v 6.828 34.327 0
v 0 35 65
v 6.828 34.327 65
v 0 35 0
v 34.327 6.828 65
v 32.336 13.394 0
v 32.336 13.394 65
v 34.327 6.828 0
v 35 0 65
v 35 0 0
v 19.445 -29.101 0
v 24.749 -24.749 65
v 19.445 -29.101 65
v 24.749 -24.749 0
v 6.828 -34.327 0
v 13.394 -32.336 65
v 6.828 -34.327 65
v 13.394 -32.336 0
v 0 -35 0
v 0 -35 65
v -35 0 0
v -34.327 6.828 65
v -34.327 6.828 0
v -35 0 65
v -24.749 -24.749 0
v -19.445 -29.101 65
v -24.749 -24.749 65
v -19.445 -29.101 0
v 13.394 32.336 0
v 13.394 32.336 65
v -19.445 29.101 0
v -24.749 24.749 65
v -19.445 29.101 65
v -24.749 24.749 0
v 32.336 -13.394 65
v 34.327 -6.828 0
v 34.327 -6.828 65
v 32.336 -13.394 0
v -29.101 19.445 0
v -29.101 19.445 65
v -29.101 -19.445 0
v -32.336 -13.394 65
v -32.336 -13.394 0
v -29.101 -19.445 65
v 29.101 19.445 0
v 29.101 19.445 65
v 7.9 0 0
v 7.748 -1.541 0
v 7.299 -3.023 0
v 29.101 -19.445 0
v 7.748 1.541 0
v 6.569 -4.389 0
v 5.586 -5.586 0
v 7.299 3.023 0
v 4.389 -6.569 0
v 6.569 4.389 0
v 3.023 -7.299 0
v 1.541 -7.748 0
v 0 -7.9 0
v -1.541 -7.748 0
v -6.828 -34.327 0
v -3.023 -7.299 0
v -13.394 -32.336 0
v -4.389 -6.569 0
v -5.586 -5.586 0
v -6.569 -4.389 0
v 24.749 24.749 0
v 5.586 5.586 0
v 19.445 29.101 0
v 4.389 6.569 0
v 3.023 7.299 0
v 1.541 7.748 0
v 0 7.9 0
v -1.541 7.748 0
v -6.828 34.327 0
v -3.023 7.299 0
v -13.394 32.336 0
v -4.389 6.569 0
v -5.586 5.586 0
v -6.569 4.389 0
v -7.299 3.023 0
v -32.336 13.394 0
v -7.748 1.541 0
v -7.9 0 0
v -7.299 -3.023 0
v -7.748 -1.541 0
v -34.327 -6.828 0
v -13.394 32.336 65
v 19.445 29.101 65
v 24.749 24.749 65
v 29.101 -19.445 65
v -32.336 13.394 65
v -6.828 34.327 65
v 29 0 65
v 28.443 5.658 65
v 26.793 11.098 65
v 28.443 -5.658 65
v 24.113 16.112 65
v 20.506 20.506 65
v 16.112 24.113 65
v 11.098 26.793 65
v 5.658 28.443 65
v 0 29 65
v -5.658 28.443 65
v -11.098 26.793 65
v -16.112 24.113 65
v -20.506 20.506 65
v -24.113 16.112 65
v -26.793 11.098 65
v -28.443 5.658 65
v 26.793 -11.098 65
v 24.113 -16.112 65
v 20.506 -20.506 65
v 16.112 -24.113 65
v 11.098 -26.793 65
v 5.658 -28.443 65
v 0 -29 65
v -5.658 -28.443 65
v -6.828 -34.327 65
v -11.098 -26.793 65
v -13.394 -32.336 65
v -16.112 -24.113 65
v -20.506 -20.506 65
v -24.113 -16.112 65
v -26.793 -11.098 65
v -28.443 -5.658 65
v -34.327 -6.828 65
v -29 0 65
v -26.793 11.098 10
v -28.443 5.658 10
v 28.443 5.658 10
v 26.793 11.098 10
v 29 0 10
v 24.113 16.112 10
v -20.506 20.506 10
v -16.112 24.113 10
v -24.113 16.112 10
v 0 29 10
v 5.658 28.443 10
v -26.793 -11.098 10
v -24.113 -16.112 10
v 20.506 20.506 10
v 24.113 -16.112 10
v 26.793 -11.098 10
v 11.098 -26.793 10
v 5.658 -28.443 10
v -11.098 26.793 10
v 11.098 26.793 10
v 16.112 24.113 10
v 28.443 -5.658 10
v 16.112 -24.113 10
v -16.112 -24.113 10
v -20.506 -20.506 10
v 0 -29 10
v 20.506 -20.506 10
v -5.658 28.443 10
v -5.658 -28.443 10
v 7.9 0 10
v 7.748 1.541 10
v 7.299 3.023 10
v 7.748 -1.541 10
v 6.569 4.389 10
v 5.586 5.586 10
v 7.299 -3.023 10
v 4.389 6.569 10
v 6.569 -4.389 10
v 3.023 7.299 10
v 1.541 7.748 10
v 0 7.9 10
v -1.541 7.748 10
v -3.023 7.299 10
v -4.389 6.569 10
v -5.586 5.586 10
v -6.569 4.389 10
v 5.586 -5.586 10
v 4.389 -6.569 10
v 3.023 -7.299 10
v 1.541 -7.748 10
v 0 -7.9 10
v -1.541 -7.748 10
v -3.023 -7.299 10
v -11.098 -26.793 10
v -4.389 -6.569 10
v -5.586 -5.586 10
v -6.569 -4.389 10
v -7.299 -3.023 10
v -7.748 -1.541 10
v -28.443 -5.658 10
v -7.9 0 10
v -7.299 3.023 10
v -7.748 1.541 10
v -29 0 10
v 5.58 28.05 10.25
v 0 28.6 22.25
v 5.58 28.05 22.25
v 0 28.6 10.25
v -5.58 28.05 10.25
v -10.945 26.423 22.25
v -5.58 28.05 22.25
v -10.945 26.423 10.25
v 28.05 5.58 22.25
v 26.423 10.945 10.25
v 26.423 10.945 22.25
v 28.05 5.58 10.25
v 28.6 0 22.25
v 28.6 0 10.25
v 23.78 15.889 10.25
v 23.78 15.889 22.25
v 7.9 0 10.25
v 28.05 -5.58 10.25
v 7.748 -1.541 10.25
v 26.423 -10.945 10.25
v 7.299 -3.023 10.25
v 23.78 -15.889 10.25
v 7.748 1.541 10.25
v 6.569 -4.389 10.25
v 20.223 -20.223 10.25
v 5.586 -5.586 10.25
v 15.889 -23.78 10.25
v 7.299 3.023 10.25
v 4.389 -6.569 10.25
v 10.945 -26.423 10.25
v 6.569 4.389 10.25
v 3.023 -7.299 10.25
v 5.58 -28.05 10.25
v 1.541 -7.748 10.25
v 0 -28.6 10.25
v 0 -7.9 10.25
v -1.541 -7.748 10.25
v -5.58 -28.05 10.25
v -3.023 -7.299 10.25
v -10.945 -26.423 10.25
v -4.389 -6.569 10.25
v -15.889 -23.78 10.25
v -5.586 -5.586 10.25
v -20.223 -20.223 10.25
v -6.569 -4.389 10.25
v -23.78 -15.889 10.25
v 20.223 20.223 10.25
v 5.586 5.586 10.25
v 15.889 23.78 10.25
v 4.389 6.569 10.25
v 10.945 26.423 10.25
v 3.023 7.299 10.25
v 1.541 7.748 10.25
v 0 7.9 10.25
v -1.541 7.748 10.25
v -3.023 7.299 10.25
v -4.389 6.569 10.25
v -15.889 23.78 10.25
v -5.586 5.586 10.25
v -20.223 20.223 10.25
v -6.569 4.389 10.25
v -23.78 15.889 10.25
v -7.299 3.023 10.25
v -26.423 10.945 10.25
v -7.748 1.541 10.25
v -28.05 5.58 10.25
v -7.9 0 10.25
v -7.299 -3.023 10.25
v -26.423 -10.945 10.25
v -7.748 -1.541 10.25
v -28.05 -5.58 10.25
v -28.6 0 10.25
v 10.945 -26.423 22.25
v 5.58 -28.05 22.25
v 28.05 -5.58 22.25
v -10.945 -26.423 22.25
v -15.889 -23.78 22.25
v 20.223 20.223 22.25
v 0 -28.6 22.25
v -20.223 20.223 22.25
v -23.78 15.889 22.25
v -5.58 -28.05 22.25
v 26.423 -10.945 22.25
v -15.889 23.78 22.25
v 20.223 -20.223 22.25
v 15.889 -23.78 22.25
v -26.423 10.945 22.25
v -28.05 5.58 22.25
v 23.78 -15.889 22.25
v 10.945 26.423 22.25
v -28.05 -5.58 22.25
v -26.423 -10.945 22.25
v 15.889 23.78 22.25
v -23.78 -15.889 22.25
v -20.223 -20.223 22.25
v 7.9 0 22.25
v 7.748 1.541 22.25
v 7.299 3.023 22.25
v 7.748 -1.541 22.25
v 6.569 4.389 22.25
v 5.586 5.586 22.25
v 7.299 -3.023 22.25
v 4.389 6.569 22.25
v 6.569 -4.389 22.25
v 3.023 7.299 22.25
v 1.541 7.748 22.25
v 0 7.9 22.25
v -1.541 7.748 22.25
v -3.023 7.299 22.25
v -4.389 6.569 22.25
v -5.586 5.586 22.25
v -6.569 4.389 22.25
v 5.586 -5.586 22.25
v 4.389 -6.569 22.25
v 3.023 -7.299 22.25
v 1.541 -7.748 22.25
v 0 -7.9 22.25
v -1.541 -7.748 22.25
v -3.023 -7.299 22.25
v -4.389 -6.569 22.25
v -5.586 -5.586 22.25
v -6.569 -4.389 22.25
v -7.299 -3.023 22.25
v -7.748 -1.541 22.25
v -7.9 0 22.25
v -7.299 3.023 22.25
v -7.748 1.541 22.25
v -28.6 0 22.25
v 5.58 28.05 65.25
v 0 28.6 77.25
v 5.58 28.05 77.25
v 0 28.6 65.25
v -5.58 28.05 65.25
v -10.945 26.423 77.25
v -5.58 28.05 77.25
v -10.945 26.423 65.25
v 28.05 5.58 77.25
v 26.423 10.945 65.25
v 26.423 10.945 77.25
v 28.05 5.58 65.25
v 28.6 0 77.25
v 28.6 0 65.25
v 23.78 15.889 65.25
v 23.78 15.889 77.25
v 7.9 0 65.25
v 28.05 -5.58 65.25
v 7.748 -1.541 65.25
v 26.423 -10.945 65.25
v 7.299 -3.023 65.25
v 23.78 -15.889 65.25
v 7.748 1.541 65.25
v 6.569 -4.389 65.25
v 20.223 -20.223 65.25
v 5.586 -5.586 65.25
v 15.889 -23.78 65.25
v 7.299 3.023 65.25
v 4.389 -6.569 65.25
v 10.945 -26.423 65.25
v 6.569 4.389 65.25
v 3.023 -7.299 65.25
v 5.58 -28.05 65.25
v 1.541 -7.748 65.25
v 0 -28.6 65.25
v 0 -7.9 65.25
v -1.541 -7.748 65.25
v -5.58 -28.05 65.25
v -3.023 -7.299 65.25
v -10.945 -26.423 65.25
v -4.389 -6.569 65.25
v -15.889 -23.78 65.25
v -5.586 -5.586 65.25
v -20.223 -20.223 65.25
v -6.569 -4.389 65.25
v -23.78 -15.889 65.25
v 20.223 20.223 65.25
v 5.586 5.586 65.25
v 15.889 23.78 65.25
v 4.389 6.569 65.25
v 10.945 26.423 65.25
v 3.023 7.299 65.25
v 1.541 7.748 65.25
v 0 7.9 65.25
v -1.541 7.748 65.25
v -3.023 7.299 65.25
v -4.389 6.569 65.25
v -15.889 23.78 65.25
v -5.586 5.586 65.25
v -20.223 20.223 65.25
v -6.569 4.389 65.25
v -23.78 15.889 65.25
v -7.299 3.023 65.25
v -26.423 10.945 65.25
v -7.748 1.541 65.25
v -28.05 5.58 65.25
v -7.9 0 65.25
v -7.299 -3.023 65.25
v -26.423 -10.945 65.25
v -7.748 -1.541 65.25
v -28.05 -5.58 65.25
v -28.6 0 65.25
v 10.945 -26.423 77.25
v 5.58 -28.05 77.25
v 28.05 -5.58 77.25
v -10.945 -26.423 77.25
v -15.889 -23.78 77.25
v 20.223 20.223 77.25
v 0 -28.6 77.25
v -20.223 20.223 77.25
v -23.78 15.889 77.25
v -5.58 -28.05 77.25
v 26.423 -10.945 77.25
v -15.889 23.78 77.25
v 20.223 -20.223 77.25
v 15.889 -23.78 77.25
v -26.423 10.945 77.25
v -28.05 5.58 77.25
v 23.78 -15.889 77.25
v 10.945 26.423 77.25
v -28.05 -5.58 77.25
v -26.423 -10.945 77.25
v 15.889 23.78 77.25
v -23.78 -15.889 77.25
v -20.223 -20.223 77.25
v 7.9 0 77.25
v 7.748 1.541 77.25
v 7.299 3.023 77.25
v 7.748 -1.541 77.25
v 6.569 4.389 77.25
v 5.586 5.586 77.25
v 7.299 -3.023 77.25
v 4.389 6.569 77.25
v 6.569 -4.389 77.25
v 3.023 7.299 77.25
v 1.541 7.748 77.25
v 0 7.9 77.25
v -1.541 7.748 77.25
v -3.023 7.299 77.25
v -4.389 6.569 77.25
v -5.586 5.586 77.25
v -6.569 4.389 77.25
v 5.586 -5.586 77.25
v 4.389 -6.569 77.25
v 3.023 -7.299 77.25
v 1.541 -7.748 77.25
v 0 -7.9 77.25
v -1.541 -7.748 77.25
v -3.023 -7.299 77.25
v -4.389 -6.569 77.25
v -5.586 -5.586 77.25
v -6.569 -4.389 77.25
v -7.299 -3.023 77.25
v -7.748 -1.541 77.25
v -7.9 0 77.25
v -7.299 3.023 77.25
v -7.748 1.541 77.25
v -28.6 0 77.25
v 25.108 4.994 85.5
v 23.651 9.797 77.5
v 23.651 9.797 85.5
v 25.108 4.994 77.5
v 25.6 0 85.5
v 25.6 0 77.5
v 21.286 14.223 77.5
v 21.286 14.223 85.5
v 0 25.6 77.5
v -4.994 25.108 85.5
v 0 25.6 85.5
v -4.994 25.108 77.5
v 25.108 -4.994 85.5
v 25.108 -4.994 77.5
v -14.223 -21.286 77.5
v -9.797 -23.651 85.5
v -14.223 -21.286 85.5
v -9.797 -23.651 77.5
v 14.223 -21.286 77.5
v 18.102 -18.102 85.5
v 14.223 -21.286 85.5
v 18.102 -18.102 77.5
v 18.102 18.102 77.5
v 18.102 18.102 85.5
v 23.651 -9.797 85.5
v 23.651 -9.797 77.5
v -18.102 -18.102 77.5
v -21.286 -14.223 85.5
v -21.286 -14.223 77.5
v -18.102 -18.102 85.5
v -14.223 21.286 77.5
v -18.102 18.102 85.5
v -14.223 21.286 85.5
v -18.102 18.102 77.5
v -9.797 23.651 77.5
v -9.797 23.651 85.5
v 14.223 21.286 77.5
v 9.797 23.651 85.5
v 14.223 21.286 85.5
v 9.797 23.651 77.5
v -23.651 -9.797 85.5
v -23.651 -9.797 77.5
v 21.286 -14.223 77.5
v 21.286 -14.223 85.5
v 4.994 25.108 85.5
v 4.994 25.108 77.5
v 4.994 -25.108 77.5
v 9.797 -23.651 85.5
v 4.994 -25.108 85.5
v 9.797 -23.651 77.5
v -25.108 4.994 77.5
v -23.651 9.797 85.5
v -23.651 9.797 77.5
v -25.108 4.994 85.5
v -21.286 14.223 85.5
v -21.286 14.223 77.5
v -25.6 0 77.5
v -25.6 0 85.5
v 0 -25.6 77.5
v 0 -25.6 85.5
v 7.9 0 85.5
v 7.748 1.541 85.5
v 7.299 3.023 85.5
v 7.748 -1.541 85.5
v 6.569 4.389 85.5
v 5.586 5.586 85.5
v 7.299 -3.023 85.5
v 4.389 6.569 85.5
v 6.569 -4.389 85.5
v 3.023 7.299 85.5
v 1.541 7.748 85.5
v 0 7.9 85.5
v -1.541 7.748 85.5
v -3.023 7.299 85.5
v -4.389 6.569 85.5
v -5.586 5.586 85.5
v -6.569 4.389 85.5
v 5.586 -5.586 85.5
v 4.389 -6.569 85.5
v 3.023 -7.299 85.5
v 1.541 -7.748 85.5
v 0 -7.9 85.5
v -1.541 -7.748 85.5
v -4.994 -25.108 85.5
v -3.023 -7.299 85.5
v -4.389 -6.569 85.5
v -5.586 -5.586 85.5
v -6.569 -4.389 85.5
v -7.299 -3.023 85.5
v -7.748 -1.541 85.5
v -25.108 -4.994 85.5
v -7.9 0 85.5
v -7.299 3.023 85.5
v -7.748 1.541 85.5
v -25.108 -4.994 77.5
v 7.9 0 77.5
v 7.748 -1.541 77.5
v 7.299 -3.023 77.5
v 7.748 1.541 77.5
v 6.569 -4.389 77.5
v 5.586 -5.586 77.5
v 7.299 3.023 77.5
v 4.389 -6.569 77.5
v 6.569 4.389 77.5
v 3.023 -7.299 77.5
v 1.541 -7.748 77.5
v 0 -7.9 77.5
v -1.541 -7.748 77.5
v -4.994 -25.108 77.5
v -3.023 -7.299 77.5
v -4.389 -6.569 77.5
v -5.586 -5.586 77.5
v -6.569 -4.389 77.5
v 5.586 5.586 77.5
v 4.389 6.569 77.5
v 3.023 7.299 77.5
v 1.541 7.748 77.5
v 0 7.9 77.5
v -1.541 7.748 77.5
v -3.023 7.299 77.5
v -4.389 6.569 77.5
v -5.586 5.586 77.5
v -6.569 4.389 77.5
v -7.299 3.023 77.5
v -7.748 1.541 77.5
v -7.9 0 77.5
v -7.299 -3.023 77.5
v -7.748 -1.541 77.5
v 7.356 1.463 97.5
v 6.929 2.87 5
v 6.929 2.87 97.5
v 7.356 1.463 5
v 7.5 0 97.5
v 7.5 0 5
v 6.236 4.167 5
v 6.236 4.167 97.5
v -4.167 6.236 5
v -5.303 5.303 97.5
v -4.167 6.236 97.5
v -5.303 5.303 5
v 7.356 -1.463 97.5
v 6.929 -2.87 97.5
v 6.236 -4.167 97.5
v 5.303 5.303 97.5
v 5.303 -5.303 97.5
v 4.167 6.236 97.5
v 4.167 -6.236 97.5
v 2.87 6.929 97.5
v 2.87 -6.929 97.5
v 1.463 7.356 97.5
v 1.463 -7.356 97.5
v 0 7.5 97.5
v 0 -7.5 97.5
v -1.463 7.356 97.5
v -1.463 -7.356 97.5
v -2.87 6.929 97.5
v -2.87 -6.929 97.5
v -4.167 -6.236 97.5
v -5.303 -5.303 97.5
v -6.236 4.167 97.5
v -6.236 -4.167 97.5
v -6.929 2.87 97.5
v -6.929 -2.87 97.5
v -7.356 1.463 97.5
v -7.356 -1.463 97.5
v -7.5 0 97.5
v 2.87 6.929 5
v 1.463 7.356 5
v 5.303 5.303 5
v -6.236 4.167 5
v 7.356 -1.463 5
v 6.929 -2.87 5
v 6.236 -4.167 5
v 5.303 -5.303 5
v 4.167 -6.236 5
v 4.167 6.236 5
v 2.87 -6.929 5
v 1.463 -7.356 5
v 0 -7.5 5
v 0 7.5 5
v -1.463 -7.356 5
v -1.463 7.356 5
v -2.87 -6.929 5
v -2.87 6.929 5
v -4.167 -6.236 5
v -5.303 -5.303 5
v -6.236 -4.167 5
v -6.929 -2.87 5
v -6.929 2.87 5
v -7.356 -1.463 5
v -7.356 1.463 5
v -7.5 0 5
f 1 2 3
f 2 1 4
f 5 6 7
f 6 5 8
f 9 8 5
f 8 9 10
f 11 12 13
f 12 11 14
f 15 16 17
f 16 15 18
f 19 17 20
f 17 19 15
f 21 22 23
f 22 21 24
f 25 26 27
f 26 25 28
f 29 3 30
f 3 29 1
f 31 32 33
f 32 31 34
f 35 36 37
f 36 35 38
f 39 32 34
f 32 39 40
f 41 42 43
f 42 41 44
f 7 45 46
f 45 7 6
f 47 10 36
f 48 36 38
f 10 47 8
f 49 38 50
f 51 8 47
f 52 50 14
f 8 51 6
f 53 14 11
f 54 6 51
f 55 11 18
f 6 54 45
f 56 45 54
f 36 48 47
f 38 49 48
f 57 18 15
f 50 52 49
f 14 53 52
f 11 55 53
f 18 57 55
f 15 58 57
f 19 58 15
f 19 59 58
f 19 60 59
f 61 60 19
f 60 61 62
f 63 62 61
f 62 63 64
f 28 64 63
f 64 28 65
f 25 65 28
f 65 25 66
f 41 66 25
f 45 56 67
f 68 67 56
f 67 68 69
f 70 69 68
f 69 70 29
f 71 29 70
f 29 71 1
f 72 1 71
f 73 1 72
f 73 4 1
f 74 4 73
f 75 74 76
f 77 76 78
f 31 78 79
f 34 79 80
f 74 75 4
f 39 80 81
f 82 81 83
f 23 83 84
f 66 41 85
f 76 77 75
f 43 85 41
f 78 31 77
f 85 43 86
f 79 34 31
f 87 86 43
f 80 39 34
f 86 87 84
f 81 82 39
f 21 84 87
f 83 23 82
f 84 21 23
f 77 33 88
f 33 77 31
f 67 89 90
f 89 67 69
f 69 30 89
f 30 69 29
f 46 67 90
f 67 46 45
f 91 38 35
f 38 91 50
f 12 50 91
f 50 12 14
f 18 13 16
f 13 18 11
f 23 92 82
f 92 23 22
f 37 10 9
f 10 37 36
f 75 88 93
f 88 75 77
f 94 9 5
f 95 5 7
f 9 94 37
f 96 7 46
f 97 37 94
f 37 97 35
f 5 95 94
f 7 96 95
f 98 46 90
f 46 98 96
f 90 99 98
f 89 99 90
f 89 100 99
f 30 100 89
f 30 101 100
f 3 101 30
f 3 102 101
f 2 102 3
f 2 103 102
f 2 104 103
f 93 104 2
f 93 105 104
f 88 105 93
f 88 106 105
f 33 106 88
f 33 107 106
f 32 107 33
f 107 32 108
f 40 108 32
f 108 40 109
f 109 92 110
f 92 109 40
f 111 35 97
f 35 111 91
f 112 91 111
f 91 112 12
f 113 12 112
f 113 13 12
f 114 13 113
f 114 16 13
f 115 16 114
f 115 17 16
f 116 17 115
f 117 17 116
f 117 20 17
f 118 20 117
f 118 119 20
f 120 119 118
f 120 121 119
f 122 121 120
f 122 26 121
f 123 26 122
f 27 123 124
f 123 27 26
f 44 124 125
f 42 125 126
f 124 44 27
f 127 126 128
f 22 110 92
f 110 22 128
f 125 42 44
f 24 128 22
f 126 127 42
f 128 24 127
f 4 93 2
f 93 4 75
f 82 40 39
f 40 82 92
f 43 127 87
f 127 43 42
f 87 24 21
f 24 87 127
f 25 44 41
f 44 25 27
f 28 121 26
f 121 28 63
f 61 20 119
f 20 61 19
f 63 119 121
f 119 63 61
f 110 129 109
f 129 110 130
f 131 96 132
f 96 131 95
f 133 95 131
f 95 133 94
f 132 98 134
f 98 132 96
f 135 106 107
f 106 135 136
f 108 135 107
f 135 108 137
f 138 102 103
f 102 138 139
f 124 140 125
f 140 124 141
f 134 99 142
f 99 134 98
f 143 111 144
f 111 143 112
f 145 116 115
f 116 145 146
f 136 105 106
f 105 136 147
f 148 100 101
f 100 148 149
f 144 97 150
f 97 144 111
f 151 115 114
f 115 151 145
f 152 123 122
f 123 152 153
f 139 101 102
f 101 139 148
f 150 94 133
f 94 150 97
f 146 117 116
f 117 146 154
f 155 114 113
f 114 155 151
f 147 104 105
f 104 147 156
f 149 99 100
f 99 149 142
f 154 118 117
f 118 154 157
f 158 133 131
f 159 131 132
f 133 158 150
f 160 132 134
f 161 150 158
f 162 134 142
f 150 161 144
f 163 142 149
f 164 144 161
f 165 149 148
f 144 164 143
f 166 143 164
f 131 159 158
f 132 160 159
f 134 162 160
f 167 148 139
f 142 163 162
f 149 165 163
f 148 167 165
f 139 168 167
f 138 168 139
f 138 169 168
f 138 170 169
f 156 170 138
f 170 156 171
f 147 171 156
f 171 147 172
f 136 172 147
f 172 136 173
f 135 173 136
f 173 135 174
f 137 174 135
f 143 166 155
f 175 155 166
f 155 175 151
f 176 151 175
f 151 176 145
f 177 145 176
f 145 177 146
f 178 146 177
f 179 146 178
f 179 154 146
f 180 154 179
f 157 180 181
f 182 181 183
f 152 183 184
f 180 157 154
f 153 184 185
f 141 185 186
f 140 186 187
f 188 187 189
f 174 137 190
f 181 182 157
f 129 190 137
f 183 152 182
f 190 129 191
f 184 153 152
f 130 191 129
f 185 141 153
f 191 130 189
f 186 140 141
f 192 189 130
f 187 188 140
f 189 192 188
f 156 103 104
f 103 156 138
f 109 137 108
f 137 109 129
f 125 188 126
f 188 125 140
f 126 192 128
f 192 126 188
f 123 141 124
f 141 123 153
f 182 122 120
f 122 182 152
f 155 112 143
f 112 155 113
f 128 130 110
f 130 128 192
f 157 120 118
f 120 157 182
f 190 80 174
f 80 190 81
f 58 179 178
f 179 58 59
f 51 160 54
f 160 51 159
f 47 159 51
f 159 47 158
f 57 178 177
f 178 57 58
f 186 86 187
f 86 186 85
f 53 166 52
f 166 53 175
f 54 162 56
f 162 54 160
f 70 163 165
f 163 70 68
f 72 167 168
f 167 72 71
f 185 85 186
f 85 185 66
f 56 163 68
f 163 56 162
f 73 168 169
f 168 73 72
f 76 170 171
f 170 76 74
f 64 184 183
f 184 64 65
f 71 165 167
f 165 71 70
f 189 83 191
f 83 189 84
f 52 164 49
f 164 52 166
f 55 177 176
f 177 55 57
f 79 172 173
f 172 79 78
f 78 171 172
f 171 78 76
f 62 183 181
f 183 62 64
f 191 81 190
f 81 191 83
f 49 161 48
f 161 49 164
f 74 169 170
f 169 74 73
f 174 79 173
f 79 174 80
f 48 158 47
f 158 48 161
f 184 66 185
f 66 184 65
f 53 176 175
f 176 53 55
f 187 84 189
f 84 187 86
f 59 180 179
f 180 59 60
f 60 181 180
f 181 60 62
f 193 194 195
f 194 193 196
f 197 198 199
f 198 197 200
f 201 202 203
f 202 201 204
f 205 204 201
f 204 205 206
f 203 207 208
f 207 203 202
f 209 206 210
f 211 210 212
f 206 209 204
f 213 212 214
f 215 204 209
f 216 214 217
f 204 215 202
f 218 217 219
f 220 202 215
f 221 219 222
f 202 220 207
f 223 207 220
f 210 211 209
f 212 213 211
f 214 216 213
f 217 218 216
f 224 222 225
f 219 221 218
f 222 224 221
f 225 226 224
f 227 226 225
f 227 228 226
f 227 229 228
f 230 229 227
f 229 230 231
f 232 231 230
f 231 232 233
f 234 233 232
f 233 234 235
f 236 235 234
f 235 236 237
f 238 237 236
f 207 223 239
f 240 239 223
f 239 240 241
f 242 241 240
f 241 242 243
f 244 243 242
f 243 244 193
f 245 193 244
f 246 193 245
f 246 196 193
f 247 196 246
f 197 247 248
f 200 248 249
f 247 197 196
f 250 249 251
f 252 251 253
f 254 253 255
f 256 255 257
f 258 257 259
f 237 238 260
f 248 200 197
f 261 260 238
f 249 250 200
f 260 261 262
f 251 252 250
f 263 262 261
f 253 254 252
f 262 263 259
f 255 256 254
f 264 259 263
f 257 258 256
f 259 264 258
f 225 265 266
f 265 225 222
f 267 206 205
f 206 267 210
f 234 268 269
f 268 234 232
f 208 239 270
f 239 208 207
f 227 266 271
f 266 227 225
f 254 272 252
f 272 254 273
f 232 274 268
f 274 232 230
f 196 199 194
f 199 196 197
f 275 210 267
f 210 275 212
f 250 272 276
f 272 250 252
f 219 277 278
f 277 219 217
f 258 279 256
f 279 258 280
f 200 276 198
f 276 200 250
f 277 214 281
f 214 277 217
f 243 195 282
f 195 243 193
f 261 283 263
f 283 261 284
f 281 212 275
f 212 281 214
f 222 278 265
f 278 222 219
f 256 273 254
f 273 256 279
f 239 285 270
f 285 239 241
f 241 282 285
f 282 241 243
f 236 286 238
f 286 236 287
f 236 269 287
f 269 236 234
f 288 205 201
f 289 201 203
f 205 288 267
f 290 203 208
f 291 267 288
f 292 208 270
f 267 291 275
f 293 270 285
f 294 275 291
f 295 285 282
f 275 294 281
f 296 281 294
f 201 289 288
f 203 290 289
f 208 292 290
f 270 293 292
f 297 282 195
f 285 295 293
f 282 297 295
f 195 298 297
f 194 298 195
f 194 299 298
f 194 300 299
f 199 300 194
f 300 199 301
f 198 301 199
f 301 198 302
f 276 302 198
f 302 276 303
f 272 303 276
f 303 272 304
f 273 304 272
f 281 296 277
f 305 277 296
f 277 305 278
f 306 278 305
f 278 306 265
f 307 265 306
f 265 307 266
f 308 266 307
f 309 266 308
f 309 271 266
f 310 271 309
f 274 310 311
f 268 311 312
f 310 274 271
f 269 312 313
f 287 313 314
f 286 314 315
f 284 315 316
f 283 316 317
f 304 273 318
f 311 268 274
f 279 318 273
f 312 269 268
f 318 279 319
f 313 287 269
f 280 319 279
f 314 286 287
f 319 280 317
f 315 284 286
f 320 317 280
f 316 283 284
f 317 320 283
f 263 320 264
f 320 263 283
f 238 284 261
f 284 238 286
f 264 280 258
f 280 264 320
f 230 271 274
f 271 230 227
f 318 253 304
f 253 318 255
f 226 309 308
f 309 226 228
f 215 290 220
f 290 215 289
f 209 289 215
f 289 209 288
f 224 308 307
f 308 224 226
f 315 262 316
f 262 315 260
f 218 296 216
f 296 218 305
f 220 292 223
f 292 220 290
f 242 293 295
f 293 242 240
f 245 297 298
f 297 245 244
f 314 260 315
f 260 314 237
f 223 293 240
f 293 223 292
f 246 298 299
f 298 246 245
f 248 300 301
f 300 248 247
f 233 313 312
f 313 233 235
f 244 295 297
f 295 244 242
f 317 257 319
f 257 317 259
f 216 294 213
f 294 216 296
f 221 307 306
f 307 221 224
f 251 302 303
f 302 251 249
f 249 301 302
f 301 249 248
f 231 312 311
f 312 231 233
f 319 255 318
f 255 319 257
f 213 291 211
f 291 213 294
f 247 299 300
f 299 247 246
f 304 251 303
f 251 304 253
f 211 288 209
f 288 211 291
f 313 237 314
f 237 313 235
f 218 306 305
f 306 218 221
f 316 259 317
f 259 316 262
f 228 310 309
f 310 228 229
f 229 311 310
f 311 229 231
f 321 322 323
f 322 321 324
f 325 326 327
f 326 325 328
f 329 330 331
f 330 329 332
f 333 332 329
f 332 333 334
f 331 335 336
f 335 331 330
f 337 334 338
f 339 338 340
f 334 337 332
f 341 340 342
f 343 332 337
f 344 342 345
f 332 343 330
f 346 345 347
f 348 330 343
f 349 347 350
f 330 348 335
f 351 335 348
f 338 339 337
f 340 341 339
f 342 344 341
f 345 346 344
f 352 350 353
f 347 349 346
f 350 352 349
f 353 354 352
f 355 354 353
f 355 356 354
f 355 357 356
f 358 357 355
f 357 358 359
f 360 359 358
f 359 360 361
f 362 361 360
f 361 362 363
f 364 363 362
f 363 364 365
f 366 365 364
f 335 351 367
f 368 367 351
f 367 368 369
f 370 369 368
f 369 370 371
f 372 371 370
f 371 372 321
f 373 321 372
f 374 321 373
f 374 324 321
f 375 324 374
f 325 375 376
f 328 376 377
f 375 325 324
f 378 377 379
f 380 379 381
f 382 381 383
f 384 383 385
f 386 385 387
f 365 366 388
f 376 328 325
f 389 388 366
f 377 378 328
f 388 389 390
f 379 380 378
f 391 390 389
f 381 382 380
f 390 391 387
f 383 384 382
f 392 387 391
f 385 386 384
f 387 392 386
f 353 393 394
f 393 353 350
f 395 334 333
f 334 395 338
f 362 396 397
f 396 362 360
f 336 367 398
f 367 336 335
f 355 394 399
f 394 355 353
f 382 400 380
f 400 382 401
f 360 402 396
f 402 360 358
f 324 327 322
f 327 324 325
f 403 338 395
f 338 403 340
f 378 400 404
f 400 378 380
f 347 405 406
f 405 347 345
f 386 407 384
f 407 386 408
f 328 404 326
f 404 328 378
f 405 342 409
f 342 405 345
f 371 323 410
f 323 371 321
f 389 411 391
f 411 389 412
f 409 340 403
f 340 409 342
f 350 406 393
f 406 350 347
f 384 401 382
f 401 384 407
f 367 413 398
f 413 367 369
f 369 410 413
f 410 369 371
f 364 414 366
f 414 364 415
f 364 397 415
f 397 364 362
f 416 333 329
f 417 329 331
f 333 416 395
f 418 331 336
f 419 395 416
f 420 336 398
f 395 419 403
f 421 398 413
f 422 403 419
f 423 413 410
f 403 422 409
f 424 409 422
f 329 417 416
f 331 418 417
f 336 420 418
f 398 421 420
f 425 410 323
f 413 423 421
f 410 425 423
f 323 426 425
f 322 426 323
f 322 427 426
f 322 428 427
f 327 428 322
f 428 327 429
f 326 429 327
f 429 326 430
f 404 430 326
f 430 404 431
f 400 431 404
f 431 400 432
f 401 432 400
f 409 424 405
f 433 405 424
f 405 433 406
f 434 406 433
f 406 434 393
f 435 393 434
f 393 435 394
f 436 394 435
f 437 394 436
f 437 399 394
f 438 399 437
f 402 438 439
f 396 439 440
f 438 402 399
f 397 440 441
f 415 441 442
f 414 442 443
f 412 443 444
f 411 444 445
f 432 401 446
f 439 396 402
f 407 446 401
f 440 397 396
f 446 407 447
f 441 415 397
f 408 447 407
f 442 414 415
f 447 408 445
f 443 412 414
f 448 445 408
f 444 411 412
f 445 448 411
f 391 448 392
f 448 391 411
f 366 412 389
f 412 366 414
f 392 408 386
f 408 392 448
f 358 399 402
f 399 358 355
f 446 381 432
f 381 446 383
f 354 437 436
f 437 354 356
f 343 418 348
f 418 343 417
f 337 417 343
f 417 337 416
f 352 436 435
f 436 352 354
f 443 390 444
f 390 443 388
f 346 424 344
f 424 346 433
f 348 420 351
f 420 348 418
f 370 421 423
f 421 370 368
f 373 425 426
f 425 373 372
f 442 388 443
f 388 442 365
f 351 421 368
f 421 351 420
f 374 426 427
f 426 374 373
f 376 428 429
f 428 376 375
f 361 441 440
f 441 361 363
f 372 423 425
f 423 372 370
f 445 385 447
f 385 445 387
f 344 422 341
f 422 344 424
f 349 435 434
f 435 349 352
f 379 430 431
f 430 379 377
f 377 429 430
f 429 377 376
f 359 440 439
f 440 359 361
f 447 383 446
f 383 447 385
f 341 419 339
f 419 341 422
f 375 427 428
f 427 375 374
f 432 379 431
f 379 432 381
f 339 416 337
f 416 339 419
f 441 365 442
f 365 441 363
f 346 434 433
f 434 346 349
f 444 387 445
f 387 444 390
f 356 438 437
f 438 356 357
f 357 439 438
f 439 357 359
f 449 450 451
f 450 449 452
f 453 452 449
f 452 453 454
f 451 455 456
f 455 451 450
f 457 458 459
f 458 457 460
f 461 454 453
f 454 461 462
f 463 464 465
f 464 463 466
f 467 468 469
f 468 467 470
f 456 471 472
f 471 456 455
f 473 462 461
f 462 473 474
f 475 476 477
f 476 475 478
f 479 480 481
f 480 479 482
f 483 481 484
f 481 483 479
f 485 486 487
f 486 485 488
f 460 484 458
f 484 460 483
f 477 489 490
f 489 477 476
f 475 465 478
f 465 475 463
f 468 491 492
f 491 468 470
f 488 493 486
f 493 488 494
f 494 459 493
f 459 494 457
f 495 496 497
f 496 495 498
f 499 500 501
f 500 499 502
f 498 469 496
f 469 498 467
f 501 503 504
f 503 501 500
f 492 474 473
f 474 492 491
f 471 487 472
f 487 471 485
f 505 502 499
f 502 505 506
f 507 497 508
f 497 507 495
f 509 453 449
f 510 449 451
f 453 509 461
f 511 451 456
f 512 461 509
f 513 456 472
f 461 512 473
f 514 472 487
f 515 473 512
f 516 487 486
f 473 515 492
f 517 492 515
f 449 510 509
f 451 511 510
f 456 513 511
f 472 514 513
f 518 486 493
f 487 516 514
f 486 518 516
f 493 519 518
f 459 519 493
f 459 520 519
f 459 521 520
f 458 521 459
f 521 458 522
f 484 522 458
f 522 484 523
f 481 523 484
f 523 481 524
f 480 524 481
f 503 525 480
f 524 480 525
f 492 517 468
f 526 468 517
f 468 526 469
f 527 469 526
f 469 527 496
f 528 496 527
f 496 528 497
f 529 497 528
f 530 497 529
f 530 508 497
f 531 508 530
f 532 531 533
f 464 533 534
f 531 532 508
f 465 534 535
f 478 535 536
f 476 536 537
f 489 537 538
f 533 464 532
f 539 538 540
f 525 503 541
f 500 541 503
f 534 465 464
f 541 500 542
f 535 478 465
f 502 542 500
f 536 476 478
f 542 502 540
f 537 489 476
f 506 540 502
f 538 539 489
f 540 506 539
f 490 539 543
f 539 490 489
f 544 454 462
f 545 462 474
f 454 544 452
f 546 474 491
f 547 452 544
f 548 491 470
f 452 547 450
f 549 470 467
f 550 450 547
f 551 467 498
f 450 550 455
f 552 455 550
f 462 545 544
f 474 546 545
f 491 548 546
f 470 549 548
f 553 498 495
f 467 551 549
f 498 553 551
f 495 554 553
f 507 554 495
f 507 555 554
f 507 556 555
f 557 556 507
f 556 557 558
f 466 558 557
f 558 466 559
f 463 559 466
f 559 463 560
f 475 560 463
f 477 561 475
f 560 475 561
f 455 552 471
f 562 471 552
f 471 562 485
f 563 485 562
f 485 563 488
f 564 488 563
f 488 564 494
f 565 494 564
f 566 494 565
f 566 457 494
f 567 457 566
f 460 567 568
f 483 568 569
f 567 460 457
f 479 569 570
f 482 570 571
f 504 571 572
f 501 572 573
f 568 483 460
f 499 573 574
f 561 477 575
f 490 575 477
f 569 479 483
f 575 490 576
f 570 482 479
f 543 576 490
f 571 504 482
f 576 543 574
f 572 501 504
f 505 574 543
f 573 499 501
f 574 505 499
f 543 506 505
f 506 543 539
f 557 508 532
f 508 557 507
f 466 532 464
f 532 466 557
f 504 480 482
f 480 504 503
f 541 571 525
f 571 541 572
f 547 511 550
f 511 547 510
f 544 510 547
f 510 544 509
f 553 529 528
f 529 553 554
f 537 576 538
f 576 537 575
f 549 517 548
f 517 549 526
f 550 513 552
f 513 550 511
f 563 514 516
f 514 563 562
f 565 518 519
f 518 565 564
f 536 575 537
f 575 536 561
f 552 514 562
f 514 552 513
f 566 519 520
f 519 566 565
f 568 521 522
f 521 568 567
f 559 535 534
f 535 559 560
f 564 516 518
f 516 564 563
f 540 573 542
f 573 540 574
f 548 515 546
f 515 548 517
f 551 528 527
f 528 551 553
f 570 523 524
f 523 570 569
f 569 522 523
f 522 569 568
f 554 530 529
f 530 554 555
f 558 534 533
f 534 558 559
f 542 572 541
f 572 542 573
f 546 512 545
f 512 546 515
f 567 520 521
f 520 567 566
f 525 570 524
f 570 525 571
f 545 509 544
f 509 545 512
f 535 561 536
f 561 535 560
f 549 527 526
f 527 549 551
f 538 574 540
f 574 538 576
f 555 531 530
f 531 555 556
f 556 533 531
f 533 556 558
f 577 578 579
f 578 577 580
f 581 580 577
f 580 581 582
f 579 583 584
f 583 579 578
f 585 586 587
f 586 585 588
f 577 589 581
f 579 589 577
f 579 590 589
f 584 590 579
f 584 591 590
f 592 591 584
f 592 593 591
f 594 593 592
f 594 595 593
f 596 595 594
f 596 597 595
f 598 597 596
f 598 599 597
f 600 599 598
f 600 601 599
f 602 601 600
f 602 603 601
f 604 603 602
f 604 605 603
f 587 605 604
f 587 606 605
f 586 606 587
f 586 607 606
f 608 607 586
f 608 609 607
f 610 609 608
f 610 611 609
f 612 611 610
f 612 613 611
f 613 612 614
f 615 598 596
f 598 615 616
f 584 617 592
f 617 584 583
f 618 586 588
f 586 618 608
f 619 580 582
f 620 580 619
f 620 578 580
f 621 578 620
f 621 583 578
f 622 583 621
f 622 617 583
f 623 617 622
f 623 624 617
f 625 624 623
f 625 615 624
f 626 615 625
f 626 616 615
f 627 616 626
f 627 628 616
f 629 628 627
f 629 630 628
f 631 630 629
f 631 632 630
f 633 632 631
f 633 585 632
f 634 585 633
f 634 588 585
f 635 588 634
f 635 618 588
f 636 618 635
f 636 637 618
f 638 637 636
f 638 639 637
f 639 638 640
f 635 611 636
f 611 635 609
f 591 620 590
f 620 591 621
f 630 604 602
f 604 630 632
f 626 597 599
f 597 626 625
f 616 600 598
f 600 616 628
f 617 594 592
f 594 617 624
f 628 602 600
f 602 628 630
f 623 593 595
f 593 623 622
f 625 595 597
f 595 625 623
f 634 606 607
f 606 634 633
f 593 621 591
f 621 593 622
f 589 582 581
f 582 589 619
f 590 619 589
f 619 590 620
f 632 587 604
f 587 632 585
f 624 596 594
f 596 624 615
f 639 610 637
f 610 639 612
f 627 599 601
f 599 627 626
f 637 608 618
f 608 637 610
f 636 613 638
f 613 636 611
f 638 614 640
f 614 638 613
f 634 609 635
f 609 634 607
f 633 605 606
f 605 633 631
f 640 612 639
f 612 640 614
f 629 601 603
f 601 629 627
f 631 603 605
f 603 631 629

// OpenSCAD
$fn = 32;

// ------------------------------------------------------------------------
// Bearing housing: housing d70, two bearings and a shaft
// Every part is its own module, assembly() places them once.
// ------------------------------------------------------------------------

// --- part 1 ---
module housing() {
  difference() {
    cylinder(h = 65, d = 70);
    translate([0, 0, 10]) cylinder(h = 56, d = 58);
    translate([0, 0, -1]) cylinder(h = 12, d = 15.8);
  }
}

// --- part 2 ---
module bearing_lower() {
  difference() {
      translate([0, 0, 0]) cylinder(h = 12, d = 57.2);
      translate([0, 0, -1]) cylinder(h = 14, d = 15.8);
    }
}

// --- part 3 ---
module bearing_upper() {
  difference() {
      translate([0, 0, 0]) cylinder(h = 12, d = 57.2);
      translate([0, 0, -1]) cylinder(h = 14, d = 15.8);
    }
}

// --- part 4 ---
module spacer() {
  difference() {
      translate([0, 0, 0]) cylinder(h = 8, d = 51.2);
      translate([0, 0, -1]) cylinder(h = 10, d = 15.8);
    }
}

// --- part 5 ---
module shaft() {
  translate([0, 0, -46.25]) cylinder(h = 92.5, d = 15);
}

// --- assembly ---
module assembly() {
  translate([0, 0, 0]) rotate([0, 0, 0]) housing();
  translate([0, 0, 10.25]) rotate([0, 0, 0]) bearing_lower();
  translate([0, 0, 65.25]) rotate([0, 0, 0]) bearing_upper();
  translate([0, 0, 77.5]) rotate([0, 0, 0]) spacer();
  translate([0, 0, 51.25]) rotate([0, 0, 0]) shaft();
}

assembly();
